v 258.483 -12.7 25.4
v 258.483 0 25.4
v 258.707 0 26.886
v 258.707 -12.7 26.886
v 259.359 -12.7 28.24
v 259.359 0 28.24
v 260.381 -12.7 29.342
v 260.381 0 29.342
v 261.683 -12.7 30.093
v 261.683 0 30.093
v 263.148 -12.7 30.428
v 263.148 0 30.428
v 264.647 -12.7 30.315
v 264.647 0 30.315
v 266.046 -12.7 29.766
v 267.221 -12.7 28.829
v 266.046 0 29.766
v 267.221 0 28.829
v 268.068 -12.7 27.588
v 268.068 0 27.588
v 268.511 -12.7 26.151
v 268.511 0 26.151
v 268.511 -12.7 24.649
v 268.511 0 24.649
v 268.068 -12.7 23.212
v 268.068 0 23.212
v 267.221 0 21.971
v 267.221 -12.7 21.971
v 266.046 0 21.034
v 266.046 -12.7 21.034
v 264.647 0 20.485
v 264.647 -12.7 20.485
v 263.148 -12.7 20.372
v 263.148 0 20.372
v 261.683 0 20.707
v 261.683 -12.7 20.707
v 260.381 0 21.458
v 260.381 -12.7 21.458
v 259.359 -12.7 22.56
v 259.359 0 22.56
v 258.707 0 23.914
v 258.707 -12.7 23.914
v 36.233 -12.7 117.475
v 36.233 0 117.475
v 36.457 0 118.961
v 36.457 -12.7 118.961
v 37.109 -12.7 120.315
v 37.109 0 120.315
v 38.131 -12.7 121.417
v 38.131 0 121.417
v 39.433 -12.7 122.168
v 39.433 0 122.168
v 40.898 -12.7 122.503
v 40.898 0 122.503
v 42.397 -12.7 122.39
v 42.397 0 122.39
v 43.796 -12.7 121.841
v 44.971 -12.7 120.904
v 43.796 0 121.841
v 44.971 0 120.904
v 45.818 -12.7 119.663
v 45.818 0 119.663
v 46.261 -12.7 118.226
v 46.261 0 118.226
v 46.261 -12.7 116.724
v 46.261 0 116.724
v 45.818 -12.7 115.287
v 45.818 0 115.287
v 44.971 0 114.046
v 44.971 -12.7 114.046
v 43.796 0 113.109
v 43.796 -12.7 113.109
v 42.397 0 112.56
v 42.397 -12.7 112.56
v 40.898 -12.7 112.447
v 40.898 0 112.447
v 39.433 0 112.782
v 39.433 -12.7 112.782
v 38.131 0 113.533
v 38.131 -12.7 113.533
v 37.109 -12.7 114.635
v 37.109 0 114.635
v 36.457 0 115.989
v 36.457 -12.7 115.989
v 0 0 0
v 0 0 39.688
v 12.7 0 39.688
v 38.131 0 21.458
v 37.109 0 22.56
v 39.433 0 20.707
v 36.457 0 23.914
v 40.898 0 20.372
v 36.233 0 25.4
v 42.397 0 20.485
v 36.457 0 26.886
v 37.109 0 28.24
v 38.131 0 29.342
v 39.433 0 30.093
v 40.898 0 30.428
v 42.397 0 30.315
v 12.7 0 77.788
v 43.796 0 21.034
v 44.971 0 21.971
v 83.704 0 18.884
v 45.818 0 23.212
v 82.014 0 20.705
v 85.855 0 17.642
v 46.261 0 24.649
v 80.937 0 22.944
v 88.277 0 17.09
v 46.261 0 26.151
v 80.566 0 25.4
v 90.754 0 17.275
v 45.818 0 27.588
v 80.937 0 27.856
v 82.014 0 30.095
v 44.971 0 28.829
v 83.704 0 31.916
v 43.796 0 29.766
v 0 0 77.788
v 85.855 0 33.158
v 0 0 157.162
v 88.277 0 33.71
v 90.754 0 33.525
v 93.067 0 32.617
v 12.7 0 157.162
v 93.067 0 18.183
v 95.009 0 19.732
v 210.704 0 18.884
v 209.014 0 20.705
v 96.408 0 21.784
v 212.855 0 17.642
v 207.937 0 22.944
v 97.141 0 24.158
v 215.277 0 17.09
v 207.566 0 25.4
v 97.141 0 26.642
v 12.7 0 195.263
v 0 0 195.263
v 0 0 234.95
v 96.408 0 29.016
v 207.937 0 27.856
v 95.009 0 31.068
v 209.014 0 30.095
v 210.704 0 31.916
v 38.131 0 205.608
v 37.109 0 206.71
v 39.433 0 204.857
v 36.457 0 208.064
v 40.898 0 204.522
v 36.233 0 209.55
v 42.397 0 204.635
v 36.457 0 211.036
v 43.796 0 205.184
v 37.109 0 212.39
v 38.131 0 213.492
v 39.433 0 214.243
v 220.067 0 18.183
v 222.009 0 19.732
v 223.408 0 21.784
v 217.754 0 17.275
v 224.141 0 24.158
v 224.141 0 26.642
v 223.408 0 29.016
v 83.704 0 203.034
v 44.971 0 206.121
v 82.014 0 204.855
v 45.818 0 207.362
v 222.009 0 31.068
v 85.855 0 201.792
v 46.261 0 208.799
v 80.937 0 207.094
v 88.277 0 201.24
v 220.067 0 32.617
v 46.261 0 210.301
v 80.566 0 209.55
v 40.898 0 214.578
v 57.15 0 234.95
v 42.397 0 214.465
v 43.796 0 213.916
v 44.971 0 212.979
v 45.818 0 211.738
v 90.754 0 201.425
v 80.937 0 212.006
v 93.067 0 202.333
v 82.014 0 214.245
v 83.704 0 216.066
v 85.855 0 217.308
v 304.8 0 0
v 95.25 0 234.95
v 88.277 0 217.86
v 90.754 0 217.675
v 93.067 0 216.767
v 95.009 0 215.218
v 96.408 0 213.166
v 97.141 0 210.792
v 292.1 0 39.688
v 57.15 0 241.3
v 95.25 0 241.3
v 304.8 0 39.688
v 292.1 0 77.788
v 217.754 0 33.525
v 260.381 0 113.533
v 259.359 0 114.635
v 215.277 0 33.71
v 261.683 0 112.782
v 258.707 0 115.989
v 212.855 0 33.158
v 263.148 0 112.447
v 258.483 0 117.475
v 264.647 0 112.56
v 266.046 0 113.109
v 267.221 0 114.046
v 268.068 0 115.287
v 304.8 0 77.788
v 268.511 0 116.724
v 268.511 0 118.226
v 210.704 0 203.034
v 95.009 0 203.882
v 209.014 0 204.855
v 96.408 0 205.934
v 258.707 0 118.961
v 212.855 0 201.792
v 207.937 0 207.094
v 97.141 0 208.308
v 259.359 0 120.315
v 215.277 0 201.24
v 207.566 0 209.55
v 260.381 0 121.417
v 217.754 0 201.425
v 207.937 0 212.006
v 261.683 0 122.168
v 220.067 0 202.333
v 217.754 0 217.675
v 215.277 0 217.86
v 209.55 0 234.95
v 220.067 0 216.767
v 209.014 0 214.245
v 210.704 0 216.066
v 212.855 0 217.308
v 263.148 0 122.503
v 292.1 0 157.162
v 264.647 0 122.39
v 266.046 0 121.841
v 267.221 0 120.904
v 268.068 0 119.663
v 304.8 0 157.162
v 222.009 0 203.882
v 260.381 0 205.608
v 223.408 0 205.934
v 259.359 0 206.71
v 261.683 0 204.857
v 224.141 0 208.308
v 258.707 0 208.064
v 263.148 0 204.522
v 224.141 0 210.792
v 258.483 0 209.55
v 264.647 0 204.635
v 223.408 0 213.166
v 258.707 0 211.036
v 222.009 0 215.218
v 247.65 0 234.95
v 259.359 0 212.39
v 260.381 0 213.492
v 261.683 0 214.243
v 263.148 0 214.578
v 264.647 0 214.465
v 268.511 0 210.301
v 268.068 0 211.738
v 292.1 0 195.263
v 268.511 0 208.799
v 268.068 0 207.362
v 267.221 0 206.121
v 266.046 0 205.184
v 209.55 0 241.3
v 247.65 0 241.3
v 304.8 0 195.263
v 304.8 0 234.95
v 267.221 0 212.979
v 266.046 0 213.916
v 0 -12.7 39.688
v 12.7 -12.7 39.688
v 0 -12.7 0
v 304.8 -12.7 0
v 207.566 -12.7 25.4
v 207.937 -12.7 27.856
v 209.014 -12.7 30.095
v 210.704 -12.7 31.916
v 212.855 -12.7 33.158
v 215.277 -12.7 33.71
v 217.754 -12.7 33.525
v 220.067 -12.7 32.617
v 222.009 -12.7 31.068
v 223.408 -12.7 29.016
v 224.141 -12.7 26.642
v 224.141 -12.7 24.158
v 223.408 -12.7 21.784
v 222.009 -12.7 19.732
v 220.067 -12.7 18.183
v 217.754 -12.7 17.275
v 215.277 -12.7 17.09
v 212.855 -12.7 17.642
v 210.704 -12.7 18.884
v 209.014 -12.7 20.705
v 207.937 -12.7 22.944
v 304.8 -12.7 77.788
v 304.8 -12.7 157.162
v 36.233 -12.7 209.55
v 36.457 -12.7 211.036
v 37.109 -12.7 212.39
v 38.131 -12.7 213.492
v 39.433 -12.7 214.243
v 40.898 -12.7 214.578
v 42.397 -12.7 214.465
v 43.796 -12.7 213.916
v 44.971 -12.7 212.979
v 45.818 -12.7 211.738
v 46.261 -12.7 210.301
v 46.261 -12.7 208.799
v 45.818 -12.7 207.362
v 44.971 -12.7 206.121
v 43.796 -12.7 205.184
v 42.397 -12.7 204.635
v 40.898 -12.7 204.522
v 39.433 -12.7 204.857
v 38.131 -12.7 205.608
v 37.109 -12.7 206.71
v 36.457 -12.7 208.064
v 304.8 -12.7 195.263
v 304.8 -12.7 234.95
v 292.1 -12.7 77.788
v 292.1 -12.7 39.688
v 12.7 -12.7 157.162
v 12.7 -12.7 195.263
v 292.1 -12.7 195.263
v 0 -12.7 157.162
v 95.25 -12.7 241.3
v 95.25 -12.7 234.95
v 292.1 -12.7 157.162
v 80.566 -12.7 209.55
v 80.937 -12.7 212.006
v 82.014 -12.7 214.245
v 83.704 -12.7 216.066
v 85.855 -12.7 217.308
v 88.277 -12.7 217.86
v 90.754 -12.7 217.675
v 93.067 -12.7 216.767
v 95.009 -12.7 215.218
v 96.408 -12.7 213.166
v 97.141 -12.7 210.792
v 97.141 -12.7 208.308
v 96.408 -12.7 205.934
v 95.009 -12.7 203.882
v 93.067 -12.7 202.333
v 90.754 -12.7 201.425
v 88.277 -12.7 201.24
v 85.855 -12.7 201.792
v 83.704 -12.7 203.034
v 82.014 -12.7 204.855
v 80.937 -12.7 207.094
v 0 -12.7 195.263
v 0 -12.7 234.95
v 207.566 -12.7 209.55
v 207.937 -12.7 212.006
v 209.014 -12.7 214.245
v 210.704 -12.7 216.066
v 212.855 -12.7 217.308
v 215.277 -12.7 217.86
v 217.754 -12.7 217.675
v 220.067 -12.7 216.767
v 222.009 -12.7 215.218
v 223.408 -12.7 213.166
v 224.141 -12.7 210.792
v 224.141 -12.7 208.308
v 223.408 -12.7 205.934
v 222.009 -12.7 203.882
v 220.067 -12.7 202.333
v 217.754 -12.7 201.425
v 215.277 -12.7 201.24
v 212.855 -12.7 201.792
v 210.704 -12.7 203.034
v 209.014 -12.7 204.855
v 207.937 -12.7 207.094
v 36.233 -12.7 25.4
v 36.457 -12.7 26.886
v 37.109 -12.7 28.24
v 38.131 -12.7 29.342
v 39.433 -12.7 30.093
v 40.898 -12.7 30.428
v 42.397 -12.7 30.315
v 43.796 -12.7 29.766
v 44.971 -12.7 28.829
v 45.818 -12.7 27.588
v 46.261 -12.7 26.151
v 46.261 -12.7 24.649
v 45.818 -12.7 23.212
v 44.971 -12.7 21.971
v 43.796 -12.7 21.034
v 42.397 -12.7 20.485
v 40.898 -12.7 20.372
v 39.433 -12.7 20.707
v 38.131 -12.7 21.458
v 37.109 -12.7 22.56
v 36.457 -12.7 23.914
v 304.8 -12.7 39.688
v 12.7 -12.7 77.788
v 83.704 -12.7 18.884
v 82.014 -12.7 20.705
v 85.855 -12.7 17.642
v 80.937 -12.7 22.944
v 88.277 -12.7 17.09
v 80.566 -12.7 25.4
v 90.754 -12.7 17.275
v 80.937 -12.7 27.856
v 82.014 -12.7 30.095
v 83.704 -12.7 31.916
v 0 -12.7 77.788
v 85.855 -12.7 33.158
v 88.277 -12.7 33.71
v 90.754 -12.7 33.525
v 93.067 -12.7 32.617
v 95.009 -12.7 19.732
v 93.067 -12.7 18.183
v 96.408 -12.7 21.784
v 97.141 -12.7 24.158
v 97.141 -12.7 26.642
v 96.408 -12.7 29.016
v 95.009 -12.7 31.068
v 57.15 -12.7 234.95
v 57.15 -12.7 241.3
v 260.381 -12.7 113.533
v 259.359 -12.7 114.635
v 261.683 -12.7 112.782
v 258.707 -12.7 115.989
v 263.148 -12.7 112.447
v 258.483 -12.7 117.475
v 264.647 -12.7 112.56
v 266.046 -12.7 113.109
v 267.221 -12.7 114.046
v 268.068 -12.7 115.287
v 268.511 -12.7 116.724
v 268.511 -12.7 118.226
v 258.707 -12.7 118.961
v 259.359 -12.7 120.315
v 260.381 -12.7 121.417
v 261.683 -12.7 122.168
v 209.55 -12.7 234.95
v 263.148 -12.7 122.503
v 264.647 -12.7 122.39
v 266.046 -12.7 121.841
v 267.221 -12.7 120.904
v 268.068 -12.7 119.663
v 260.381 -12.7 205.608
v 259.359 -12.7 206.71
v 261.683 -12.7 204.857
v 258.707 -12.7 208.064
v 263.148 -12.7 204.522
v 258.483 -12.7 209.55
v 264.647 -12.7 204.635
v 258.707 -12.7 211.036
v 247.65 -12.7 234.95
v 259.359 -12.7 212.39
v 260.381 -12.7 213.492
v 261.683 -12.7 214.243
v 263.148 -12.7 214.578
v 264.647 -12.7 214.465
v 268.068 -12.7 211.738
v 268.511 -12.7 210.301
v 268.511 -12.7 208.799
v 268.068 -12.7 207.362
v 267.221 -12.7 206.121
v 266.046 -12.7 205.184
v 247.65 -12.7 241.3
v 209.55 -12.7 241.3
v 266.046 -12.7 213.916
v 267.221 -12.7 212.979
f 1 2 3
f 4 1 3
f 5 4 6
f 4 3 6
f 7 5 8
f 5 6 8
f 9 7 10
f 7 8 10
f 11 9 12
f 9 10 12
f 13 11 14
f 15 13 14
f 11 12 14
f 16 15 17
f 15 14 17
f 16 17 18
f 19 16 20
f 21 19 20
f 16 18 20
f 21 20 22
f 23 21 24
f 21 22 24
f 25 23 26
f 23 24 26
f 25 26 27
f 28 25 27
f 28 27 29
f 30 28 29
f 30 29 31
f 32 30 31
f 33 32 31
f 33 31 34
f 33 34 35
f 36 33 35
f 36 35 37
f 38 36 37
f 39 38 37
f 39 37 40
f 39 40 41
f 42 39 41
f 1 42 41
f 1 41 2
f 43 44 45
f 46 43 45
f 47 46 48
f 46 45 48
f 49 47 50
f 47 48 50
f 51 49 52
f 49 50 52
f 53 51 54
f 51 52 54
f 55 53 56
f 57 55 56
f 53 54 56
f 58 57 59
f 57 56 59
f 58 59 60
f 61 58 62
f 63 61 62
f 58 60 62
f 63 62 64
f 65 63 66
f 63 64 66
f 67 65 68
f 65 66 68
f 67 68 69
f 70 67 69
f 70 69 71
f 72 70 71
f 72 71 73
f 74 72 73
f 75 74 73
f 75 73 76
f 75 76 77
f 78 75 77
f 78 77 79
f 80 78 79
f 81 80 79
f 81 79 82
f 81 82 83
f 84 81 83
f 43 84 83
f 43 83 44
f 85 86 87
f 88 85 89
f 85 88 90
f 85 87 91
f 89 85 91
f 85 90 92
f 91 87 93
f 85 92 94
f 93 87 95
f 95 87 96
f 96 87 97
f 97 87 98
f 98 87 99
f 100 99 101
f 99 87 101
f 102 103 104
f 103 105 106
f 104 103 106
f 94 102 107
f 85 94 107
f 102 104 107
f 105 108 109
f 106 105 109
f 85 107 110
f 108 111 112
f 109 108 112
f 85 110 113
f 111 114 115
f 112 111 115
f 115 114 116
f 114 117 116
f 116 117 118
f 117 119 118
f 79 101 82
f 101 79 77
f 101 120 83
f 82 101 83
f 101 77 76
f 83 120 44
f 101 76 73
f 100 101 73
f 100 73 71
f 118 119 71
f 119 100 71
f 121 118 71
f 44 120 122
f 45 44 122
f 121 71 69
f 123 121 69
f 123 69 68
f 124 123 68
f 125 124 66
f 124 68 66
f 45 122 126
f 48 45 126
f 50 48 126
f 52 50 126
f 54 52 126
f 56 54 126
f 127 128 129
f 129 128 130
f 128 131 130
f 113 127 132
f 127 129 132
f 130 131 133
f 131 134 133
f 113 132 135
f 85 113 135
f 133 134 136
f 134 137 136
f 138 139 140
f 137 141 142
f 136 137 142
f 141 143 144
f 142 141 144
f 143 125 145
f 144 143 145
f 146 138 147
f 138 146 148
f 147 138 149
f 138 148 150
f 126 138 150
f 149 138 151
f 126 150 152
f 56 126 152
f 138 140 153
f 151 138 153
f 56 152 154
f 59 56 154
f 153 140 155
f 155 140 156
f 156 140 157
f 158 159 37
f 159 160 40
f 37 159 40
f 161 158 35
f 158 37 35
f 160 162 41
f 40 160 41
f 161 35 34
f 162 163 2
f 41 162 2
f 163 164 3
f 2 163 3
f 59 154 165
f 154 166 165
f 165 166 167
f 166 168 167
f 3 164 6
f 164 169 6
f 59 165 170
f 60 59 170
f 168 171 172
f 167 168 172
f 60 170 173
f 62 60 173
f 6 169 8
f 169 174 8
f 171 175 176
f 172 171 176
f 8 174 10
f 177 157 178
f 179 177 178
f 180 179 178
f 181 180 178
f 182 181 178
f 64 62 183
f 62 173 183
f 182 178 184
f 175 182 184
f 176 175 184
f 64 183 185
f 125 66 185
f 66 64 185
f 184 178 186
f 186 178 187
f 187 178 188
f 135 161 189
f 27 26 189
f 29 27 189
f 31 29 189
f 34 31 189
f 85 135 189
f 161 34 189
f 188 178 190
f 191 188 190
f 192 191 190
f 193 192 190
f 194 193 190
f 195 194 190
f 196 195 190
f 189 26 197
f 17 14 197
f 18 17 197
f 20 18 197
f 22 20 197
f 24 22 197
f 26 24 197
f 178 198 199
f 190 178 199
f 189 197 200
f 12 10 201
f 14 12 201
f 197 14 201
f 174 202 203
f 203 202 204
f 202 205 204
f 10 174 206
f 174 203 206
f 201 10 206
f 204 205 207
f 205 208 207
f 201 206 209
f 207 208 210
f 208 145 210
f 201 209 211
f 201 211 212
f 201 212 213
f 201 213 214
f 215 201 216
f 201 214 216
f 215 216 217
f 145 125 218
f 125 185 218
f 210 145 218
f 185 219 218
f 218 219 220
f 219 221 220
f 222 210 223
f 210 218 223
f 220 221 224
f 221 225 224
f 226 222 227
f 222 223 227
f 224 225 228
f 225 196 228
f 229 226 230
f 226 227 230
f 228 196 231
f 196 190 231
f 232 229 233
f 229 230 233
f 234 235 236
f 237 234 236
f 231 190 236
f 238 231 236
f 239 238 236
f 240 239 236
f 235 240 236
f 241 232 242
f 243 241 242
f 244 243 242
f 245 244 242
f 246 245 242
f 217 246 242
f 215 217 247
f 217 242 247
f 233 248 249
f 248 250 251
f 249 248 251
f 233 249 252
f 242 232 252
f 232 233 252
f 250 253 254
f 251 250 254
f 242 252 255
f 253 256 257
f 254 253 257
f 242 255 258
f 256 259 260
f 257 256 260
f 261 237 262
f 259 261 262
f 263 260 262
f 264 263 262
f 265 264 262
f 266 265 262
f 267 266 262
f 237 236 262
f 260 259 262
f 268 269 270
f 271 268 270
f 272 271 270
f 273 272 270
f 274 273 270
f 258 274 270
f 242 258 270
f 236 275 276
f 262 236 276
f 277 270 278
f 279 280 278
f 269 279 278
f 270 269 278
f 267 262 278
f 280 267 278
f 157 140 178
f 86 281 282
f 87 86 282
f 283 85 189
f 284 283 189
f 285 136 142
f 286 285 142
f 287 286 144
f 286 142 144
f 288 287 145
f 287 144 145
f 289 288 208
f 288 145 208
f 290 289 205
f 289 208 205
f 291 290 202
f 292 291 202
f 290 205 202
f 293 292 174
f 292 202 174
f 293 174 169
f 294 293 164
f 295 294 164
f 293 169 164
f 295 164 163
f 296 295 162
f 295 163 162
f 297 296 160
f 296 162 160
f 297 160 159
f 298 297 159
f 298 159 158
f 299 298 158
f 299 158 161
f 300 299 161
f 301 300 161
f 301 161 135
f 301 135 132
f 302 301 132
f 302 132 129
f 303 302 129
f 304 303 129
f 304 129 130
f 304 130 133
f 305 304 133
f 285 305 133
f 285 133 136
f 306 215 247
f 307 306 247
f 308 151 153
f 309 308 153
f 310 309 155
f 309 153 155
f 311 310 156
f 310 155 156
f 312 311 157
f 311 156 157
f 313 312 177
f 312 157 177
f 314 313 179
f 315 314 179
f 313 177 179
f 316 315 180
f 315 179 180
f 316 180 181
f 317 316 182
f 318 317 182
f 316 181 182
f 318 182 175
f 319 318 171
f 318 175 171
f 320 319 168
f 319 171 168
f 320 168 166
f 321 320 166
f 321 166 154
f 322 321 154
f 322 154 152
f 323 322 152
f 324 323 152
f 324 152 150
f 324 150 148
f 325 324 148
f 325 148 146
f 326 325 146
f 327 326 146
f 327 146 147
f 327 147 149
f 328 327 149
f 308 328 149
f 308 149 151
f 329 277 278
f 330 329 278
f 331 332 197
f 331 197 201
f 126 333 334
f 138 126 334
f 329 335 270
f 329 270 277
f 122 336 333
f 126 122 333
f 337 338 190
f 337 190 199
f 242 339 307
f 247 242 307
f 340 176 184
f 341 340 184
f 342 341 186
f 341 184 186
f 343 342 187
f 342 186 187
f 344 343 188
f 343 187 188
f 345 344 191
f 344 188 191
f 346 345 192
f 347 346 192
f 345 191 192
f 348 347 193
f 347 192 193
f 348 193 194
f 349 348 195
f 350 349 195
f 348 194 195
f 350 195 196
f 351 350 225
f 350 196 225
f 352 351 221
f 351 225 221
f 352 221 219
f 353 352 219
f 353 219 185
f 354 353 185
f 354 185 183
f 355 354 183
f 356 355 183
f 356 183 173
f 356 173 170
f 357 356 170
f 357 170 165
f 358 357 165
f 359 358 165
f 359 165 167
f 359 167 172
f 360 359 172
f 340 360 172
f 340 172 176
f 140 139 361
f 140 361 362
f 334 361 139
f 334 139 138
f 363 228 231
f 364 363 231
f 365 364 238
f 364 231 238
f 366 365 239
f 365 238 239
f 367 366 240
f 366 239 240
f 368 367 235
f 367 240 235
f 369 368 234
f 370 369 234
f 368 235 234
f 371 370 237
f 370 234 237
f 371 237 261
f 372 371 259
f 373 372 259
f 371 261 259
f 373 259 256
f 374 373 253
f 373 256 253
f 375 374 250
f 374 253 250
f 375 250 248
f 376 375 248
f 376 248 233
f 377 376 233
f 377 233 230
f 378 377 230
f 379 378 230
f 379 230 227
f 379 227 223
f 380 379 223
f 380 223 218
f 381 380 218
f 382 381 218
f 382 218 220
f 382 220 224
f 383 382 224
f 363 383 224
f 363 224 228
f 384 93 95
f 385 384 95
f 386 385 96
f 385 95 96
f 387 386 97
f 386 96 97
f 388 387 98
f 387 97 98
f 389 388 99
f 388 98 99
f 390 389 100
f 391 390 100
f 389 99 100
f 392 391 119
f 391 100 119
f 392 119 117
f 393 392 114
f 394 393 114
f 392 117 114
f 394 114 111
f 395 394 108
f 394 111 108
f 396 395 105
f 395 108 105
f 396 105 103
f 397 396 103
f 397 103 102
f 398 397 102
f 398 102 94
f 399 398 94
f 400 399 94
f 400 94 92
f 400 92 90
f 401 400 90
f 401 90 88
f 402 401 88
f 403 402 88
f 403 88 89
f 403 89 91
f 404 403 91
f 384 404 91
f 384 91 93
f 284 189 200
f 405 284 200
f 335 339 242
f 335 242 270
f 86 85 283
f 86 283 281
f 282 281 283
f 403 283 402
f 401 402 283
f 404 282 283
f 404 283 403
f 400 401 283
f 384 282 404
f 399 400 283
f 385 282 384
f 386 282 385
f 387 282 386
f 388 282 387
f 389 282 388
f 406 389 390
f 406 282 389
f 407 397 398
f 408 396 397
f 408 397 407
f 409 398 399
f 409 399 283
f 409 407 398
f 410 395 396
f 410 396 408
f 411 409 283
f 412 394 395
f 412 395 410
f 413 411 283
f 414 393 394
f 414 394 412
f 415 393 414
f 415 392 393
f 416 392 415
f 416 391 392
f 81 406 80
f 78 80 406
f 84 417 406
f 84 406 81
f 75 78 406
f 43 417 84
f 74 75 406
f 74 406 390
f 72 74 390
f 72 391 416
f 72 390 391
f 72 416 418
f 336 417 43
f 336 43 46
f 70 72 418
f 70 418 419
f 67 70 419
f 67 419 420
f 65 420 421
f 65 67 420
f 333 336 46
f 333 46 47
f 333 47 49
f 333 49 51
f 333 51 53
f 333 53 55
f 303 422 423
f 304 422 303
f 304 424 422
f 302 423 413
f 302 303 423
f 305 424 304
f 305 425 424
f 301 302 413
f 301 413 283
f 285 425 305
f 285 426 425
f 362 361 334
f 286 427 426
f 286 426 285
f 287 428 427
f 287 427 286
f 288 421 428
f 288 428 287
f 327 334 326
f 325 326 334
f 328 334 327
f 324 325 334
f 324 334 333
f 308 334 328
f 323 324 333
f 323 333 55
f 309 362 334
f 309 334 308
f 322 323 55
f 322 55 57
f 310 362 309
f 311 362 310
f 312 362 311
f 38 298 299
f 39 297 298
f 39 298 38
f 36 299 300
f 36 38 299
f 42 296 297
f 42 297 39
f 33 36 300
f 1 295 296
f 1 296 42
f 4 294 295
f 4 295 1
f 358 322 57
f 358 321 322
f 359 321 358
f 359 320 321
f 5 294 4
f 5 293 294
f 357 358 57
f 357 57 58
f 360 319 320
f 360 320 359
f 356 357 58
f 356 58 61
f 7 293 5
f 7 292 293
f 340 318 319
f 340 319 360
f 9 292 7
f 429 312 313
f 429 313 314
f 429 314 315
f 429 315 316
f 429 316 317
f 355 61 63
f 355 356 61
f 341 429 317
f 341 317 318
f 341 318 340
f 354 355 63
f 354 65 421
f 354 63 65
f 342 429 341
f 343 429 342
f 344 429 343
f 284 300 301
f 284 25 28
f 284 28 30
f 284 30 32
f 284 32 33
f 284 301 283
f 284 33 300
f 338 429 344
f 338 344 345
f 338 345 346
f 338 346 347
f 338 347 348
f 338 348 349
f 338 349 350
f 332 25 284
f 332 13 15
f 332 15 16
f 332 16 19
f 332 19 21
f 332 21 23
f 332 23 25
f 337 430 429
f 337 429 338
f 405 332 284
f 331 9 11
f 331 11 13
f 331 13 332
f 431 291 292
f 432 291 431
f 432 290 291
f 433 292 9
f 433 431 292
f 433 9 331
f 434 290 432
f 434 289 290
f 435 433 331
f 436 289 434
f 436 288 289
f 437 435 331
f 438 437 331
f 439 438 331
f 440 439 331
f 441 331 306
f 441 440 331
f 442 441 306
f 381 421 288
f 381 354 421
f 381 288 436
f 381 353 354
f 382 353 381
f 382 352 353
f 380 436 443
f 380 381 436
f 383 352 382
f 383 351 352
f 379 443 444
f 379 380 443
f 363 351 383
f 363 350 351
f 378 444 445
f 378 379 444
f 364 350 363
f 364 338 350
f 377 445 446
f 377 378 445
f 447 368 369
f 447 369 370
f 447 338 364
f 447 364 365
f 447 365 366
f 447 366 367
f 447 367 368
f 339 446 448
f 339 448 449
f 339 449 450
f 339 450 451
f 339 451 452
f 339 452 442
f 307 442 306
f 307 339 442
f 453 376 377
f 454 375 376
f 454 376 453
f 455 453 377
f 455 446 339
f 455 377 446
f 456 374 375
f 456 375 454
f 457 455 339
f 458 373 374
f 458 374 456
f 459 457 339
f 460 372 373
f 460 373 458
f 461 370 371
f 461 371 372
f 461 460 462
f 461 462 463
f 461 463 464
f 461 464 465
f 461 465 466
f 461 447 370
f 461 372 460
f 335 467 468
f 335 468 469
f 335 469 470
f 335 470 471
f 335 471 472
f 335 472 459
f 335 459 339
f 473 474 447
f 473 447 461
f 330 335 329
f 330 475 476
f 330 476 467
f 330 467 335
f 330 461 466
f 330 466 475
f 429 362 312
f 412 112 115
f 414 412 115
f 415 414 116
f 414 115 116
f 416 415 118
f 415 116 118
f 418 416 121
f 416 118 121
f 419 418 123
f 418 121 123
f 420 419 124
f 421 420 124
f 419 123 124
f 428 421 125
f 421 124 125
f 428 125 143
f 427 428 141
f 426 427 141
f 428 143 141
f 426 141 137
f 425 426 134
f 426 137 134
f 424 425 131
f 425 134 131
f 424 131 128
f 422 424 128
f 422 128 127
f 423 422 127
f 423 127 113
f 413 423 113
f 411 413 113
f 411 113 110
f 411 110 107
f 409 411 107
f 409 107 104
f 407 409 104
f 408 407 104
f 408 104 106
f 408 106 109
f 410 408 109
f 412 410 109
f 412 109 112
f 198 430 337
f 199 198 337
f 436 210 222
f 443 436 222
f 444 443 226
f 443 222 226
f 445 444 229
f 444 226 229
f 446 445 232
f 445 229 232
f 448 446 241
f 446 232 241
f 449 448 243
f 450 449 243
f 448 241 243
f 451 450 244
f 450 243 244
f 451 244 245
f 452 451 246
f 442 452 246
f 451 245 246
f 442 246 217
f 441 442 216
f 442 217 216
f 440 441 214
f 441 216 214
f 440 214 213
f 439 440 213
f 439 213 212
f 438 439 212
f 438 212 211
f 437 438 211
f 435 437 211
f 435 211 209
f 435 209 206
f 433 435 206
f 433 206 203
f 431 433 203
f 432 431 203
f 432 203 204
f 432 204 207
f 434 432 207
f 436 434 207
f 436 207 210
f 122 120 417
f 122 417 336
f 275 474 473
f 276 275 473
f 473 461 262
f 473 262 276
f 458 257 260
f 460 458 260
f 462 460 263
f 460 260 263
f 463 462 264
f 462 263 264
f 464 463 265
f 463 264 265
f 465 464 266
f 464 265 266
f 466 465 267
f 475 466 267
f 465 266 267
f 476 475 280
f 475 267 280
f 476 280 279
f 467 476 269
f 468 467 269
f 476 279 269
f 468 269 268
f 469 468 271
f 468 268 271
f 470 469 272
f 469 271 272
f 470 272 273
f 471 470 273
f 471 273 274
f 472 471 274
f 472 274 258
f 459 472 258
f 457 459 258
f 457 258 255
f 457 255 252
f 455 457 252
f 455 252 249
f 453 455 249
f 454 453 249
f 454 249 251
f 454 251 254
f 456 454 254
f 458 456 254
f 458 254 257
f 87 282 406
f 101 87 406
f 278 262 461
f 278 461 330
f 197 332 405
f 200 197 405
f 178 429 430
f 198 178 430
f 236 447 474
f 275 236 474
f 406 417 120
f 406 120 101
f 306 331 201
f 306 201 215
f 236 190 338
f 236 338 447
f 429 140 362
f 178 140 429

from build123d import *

# Parameters (mm, degrees)
F0_W     = 304.8
F0_H     = 234.95
F1_DEPTH = 12.7
F3_D     = 16.66748
F5_D     = 10.0838
F6_W     = 12.7
F6_H     = 38.1
F7_DEPTH = 25.4
F8_W     = 38.1
F8_H     = 6.35
F9_DEPTH = 12.7


with BuildPart() as f1:
    # F0 (on Front) → F1 (new body)
    with BuildSketch(Plane.XZ):
        with Locations((152.4, 117.475)):
            Rectangle(F0_W, F0_H)
    extrude(amount=F1_DEPTH)

    # F3 (through all)
    with Locations(Plane.XZ.offset(12.7)):
        with Locations((215.9, 25.4), (88.9, 25.4), (88.9, 209.55), (215.9, 209.55)):
            Hole(F3_D / 2)

    # F5 (through all)
    with Locations(Plane.XZ.offset(12.7)):
        with Locations((263.525, 25.4), (263.525, 209.55), (41.275, 209.55), (41.275, 25.4), (41.275, 117.475), (263.525, 117.475)):
            Hole(F5_D / 2)

    # F6 (on face) → F7 (cut)
    with BuildSketch(Plane.XZ.offset(12.7)):
        with Locations((298.45, 58.7375)):
            Rectangle(F6_W, F6_H)
        with Locations((6.35, 58.7375)):
            Rectangle(F6_W, F6_H)
        with Locations((6.35, 176.2125)):
            Rectangle(F6_W, F6_H)
        with Locations((298.45, 176.2125)):
            Rectangle(F6_W, F6_H)
    extrude(amount=-F7_DEPTH, mode=Mode.SUBTRACT)

    # F8 (on face) → F9 (join)
    with BuildSketch(Plane.XZ.offset(12.7)):
        with Locations((76.2, 238.125)):
            Rectangle(F8_W, F8_H)
        with Locations((228.6, 238.125)):
            Rectangle(F8_W, F8_H)
    extrude(amount=-F9_DEPTH)


solid = f1.part
